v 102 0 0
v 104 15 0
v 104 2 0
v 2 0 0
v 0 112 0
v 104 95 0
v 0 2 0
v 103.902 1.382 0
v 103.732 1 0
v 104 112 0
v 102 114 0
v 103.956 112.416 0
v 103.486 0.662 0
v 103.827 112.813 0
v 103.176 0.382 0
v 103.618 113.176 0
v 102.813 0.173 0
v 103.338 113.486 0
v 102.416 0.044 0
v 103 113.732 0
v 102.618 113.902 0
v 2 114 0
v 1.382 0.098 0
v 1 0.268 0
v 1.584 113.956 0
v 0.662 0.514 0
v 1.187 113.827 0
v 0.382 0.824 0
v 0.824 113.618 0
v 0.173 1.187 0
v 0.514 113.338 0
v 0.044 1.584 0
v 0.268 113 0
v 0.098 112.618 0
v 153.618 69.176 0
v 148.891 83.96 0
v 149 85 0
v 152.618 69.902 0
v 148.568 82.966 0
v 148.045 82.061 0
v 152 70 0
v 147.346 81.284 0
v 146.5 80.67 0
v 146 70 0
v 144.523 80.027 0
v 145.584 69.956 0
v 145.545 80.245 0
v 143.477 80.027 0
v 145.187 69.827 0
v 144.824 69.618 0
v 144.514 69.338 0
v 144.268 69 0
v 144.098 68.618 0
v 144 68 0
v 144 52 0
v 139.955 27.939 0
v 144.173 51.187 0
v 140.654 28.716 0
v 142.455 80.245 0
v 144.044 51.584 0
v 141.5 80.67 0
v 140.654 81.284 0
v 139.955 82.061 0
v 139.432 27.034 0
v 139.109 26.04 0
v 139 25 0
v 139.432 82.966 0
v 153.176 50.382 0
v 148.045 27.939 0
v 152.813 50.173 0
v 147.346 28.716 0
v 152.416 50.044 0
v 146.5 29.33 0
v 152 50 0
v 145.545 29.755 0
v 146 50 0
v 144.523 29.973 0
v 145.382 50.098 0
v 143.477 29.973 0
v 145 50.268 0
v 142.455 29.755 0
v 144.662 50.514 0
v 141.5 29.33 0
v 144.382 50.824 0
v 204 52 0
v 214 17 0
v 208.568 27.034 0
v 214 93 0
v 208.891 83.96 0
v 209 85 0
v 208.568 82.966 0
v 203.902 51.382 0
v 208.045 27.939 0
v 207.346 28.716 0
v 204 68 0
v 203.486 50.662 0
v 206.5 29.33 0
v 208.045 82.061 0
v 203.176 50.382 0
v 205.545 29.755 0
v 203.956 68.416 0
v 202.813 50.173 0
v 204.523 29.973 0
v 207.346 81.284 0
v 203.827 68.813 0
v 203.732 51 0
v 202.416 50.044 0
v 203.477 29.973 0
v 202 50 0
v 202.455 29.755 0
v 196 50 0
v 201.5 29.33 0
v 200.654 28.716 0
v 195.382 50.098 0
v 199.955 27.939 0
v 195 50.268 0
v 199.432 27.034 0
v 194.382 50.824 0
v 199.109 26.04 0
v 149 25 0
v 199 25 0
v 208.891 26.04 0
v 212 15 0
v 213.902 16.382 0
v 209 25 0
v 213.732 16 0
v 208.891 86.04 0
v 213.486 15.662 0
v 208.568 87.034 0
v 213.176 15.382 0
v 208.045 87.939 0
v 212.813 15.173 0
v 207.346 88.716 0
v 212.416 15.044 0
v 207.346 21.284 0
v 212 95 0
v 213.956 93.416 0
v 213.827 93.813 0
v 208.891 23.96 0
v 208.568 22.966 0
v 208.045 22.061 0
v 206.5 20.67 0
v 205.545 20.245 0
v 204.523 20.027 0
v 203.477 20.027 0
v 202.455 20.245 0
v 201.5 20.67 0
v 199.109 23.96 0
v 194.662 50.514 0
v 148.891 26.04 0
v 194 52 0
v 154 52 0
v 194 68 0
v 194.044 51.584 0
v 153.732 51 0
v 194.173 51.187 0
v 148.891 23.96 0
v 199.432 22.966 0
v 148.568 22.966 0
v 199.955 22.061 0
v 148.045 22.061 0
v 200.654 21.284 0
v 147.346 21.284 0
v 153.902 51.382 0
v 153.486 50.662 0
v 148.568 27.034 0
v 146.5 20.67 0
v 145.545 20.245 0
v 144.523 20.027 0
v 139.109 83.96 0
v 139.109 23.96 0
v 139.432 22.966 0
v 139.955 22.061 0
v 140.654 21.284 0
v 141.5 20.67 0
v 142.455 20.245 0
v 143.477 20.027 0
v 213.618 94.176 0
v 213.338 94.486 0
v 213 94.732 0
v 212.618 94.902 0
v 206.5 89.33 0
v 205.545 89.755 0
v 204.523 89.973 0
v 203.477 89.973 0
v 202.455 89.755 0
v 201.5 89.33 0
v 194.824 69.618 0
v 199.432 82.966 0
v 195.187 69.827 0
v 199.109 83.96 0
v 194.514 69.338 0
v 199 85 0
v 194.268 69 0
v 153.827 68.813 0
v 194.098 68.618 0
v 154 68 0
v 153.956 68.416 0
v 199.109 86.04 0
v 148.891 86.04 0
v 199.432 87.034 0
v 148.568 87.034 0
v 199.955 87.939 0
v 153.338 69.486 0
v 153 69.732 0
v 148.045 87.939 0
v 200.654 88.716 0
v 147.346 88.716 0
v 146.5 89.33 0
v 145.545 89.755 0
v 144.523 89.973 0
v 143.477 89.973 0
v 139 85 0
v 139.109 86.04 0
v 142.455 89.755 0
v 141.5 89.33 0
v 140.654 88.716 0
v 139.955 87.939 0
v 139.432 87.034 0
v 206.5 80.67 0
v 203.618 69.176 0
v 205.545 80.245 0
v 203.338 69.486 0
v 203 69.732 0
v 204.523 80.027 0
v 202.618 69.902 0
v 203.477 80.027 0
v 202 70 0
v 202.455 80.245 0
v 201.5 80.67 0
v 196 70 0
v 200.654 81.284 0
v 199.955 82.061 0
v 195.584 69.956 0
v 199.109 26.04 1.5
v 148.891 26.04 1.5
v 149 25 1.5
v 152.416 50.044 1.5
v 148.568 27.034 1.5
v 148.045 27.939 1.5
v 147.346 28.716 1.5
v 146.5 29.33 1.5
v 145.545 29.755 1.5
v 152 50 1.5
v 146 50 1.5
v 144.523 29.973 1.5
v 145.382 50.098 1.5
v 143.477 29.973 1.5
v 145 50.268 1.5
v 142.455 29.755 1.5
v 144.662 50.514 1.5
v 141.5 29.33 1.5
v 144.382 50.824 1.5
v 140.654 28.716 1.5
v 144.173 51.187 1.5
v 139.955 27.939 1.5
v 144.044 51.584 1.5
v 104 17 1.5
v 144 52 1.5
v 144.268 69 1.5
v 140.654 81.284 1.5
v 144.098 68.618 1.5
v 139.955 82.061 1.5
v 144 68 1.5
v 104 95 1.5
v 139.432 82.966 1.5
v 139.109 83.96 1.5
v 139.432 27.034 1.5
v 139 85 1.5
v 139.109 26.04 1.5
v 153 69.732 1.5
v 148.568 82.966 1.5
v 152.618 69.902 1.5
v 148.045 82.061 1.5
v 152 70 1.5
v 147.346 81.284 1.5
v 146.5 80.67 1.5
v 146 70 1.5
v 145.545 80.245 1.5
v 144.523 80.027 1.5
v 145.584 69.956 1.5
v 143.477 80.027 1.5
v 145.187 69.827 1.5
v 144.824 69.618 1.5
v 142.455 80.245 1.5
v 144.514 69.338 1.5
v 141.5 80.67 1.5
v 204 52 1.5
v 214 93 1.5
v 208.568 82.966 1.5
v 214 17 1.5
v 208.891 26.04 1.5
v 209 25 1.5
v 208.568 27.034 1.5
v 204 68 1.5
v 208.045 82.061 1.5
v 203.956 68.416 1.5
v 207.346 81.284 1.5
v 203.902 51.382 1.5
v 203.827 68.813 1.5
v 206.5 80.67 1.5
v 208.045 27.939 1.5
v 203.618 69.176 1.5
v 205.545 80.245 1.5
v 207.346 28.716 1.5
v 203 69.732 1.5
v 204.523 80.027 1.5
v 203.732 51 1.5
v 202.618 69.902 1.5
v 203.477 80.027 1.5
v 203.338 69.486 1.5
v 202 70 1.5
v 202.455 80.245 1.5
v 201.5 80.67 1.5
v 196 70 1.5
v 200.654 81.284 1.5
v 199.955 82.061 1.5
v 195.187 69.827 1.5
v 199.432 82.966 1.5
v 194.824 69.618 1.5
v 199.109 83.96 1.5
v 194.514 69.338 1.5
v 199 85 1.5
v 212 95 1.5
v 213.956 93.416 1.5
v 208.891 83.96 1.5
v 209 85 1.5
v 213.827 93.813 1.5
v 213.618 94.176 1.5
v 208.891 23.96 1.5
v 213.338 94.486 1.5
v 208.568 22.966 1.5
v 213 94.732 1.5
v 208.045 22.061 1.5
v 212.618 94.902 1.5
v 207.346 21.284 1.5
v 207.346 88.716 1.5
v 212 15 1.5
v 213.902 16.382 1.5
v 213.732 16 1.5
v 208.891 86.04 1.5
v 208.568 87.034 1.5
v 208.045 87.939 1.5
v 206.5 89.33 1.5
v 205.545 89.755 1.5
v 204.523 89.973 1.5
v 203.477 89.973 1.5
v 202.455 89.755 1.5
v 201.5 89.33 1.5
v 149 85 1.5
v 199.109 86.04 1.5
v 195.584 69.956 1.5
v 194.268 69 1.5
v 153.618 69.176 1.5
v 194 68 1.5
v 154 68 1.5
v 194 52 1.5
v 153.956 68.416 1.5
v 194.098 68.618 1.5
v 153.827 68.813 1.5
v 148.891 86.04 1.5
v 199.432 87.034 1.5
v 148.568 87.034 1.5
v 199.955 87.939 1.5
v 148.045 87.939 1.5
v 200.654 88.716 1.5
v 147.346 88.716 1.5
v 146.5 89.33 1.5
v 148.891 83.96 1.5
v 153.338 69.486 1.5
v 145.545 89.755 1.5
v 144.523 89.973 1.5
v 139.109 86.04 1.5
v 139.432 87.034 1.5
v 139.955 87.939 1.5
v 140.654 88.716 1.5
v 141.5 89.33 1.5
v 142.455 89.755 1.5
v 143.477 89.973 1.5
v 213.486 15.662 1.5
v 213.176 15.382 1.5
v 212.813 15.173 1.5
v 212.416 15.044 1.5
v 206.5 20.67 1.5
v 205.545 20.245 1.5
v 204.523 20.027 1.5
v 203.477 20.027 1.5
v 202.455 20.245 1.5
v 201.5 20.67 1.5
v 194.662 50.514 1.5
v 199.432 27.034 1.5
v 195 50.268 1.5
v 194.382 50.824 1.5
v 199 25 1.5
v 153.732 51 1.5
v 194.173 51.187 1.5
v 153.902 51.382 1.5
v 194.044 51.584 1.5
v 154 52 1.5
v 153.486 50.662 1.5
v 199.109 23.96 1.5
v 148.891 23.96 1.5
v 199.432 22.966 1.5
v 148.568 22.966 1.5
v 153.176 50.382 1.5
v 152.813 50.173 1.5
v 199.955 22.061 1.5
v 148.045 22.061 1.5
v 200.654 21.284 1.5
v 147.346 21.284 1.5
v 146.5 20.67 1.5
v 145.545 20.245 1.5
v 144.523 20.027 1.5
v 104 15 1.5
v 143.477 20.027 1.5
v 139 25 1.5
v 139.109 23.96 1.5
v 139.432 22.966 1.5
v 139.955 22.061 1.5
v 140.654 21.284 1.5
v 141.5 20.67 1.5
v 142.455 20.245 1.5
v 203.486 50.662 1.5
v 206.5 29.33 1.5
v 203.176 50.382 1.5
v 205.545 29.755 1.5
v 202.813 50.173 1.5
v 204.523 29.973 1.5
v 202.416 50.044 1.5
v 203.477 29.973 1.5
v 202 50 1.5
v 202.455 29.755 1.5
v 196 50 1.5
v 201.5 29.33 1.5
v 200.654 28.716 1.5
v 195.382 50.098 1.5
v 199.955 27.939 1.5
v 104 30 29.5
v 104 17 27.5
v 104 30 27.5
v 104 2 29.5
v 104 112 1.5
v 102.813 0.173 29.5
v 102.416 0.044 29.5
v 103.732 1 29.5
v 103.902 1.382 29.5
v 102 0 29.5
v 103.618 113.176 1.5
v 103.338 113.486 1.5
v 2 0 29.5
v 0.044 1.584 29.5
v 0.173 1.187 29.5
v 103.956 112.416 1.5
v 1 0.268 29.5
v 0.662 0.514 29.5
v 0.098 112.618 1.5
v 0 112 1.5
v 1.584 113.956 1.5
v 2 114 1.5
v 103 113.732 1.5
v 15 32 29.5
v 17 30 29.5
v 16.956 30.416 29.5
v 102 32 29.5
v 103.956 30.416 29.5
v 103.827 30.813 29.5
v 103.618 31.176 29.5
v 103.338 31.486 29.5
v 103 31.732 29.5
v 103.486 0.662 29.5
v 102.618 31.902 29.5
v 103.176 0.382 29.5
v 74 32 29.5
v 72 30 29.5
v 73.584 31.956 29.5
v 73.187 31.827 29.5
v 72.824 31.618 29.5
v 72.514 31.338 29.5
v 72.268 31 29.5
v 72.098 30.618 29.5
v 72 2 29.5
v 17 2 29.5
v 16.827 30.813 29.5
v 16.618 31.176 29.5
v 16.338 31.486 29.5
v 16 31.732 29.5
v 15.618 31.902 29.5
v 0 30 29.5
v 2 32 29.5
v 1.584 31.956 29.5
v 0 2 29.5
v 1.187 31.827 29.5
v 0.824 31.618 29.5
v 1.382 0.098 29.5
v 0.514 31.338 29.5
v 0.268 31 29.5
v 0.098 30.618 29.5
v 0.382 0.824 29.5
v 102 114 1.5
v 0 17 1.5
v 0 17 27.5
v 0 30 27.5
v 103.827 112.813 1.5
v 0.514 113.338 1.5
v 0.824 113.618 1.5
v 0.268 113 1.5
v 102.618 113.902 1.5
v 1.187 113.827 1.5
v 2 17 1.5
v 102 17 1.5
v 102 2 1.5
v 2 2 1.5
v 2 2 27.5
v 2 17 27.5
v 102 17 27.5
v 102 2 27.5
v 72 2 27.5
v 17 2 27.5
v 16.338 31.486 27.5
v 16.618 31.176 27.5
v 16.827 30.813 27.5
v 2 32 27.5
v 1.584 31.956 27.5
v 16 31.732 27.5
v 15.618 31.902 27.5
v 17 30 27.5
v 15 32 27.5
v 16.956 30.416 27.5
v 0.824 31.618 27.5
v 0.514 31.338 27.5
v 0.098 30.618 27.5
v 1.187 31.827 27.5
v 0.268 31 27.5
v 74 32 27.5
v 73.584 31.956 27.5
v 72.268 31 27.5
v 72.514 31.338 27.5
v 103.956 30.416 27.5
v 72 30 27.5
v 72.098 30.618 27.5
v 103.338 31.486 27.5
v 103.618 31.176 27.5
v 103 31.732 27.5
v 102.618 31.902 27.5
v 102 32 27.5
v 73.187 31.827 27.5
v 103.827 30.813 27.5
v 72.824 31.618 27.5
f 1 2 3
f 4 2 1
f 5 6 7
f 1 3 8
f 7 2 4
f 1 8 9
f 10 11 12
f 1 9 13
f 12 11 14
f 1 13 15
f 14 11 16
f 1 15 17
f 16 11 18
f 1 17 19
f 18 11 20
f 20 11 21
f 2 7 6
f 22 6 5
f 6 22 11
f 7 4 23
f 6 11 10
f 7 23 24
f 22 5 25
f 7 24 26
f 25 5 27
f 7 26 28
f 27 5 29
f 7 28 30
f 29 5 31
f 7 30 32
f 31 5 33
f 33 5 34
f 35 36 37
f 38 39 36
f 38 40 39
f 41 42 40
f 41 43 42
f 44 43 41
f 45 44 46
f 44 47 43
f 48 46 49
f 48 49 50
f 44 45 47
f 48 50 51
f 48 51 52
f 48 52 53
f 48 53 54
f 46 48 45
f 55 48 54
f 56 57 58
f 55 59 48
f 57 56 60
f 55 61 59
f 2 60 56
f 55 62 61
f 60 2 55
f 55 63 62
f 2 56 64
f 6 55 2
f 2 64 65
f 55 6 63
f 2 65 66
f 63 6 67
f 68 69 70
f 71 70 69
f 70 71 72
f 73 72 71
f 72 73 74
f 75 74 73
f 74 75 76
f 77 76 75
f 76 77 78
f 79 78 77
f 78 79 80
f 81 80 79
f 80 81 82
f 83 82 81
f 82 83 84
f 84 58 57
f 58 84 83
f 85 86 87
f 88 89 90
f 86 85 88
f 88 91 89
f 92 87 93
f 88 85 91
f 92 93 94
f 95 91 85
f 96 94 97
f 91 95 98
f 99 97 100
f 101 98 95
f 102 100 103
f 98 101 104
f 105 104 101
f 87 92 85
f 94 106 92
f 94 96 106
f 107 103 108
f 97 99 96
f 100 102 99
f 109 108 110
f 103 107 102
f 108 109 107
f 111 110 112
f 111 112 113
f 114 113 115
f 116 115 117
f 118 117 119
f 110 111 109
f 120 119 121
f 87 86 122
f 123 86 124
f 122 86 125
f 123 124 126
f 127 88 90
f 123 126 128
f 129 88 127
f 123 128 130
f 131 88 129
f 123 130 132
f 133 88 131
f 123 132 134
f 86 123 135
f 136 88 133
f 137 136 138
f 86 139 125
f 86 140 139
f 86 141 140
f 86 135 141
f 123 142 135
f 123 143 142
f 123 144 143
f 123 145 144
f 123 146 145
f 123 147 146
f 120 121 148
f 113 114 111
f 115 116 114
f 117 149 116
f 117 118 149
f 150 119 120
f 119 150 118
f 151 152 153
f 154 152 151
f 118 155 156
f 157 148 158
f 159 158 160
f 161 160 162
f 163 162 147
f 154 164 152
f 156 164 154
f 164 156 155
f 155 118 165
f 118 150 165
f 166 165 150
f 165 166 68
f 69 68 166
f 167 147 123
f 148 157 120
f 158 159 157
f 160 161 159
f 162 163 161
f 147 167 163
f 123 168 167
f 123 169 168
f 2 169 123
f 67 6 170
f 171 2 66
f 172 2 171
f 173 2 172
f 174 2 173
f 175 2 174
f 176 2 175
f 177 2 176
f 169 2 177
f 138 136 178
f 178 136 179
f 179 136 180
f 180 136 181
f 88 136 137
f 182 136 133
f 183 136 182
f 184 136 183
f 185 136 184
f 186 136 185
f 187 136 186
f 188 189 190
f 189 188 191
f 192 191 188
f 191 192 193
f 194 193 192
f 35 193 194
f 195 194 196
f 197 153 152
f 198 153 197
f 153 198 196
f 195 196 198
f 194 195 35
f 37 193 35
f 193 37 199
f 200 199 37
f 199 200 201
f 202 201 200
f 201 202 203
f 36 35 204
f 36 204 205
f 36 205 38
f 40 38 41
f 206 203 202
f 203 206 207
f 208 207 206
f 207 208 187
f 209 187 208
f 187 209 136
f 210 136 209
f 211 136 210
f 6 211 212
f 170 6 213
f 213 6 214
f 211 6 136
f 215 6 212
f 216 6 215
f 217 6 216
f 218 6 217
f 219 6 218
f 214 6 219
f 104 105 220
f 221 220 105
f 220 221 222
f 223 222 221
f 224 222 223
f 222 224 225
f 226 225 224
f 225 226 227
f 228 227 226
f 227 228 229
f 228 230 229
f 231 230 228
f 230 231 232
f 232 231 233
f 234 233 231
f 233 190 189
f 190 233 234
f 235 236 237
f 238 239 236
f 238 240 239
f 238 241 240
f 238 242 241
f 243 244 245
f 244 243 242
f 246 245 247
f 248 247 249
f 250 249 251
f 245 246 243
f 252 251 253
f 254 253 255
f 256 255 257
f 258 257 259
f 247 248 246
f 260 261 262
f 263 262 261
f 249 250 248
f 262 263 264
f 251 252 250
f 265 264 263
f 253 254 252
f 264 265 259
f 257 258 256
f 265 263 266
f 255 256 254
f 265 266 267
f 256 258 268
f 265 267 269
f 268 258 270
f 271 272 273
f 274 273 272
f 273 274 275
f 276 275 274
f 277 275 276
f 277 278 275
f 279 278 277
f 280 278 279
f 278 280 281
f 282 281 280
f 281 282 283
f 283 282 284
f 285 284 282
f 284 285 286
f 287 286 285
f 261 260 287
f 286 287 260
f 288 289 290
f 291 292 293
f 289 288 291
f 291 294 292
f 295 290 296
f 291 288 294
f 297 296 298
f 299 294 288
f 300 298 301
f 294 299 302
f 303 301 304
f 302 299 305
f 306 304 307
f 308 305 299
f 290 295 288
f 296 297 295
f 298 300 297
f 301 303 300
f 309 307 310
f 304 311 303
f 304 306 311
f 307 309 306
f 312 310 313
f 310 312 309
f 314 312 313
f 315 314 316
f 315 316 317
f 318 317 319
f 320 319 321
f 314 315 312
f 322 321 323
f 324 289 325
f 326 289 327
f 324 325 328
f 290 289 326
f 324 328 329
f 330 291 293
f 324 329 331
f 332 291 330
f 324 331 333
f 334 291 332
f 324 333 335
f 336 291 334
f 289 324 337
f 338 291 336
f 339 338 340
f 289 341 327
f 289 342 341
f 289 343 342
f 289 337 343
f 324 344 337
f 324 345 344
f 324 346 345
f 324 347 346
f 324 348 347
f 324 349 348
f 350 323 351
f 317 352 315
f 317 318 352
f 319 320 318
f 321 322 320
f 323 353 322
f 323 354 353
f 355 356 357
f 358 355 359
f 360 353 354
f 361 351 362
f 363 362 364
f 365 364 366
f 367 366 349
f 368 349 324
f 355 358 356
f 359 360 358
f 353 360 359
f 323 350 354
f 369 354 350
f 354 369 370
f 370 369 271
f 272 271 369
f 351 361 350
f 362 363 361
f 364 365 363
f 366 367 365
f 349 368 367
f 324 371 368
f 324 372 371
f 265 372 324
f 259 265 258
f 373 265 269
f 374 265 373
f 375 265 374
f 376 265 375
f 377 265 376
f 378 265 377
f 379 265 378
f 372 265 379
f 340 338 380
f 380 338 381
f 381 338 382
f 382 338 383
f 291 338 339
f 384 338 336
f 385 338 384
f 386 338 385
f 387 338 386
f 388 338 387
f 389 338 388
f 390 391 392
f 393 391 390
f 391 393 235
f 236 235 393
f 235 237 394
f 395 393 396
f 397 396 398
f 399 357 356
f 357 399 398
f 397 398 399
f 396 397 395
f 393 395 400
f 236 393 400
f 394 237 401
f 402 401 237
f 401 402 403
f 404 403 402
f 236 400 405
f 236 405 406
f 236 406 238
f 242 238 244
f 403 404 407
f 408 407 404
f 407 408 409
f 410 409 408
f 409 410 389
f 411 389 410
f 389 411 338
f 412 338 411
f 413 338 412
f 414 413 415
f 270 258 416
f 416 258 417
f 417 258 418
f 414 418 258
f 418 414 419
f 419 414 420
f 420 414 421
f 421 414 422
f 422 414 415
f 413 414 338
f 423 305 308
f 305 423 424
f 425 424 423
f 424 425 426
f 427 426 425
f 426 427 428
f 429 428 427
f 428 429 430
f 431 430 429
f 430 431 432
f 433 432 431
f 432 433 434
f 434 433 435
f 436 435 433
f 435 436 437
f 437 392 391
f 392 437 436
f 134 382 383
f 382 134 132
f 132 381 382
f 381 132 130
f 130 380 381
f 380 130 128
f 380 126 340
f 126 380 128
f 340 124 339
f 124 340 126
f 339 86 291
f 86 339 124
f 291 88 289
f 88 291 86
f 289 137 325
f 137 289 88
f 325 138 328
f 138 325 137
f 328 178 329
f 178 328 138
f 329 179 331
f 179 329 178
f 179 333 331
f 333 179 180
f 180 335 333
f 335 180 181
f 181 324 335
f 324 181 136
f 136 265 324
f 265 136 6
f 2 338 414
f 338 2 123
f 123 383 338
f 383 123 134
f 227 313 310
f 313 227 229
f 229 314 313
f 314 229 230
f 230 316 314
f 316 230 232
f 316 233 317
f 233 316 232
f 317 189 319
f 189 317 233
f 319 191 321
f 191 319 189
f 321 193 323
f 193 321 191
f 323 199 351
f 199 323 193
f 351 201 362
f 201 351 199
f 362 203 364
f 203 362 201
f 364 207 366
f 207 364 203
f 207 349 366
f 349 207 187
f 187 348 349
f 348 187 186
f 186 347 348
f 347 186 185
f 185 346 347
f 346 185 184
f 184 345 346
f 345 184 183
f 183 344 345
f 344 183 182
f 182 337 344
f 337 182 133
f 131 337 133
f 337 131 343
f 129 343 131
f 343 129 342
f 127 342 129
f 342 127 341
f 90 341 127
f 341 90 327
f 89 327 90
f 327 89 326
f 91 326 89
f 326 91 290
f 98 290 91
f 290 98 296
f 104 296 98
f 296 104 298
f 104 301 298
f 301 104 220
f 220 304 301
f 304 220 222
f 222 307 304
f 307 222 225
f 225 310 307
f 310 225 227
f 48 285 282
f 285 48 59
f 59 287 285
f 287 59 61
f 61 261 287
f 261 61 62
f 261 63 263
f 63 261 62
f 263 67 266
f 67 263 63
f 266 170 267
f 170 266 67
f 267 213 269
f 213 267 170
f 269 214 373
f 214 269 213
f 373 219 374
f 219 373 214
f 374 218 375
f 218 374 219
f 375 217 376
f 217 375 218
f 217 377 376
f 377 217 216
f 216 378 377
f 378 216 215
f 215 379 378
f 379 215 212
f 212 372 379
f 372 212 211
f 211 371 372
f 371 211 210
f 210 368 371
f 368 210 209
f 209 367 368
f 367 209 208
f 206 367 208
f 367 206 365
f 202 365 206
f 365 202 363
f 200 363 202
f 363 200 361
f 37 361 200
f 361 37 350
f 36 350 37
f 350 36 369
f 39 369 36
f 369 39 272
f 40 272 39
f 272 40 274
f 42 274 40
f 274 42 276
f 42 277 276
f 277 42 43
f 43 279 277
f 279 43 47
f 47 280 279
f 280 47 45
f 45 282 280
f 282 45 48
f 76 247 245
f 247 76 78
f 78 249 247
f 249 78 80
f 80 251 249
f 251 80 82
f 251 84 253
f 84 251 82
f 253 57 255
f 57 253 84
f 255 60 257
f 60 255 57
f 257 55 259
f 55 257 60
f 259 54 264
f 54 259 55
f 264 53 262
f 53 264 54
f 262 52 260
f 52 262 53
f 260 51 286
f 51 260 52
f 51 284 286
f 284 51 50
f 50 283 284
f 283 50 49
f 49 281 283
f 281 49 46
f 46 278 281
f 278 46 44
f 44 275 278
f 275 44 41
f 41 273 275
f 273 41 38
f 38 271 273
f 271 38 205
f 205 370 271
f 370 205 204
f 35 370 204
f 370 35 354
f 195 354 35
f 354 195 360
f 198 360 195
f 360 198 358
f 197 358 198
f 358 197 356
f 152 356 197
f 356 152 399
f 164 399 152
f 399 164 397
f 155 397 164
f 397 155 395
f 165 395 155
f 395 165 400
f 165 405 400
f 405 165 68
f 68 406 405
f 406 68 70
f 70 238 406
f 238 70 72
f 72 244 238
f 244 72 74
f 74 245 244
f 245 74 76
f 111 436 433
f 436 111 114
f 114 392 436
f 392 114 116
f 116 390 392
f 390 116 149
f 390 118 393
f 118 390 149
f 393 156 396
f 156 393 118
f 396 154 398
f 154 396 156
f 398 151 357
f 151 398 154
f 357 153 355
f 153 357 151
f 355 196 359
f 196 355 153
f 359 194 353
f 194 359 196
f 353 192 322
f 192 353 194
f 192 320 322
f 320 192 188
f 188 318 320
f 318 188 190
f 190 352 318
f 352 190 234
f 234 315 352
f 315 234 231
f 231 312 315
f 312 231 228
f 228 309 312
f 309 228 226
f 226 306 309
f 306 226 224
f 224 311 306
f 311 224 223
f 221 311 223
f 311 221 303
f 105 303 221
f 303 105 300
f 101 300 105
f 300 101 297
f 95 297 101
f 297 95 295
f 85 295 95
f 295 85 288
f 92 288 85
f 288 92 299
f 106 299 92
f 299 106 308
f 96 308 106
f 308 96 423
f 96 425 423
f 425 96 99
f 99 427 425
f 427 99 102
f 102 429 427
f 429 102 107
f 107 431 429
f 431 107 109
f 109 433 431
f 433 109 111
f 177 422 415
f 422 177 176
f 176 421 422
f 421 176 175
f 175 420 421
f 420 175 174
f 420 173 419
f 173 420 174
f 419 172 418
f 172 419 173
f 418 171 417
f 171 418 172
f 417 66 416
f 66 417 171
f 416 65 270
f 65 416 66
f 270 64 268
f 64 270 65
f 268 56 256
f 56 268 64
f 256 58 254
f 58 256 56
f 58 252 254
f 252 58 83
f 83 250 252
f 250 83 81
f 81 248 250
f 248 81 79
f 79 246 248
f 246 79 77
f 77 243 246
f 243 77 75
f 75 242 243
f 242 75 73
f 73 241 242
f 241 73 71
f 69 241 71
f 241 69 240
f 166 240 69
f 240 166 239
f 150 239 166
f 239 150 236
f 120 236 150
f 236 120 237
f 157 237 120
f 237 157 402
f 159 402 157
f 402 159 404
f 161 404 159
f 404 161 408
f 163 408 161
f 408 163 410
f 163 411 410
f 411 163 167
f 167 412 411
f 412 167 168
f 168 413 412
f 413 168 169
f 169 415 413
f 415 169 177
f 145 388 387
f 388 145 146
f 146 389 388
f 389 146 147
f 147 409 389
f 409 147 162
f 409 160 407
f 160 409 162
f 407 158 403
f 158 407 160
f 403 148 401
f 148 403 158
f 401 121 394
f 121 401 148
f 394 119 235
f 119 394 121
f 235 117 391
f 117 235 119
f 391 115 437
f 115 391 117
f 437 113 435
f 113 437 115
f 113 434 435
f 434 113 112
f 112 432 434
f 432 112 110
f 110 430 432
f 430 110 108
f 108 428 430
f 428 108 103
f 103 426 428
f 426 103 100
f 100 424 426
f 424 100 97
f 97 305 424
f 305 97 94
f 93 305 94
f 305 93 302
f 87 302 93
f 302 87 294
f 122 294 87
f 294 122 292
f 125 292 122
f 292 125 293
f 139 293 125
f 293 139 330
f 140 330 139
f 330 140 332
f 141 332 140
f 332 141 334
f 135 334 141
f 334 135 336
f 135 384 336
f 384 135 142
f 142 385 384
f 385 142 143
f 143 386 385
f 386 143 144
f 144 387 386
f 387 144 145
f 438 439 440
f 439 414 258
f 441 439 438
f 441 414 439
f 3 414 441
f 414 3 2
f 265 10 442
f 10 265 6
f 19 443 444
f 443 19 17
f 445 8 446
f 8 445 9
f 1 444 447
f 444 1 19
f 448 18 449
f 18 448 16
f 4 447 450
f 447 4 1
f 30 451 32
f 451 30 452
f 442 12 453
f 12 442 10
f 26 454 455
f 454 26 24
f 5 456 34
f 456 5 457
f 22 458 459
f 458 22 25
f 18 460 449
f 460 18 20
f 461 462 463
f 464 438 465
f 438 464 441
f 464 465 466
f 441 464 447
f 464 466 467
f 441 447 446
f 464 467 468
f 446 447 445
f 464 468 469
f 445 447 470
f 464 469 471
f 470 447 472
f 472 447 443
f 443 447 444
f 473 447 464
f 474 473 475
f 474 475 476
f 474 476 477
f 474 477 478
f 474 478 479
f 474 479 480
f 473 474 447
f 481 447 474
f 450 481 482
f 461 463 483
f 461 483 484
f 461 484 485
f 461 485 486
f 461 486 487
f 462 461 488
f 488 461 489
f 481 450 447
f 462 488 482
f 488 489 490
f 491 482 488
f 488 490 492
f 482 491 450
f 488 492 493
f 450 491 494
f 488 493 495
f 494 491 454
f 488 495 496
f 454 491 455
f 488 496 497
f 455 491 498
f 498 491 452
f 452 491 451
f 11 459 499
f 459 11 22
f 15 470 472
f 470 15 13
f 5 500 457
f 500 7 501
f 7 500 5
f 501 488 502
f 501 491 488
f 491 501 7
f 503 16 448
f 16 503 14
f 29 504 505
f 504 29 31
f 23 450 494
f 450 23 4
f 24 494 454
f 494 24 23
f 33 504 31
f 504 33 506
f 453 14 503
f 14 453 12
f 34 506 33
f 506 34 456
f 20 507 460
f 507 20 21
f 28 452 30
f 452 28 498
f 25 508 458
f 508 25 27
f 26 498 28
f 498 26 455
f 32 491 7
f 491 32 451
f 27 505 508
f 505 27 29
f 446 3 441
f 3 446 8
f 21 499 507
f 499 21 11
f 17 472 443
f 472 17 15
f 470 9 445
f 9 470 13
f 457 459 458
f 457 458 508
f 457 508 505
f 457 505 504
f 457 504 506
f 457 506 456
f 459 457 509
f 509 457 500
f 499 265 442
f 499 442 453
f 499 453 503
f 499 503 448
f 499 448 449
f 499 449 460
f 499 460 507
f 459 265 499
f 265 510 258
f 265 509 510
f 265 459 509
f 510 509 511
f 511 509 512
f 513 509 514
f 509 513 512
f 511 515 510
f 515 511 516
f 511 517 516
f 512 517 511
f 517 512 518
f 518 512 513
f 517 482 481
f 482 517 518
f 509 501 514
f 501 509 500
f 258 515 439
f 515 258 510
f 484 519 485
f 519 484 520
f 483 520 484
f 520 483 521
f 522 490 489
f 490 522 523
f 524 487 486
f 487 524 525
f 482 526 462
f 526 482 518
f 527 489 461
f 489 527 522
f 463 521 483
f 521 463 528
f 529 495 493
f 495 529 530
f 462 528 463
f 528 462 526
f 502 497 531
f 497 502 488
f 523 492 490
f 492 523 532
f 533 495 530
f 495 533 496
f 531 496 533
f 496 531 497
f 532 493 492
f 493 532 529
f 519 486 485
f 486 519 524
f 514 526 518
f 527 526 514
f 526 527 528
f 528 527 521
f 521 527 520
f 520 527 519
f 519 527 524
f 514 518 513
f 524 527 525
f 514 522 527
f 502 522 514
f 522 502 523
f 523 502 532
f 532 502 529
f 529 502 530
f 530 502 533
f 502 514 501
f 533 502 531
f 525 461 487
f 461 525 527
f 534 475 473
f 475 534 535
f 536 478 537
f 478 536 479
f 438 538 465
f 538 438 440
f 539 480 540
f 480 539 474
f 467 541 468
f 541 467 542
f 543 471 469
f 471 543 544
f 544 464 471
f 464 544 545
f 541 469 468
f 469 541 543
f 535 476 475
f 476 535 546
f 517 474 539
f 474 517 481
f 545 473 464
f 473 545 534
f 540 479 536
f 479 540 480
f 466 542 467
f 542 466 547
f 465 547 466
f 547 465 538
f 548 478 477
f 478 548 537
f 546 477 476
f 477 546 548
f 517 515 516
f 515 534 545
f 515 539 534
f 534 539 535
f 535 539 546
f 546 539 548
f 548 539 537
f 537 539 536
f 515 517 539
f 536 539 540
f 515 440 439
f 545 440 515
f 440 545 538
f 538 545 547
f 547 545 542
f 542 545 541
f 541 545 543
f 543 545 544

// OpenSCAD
$fn = 30;

base_depth = 1.5;
wall_thickness = 2;

ont_width = 80; // 611B/D
// ont_width = 90; // 611Q
ont_height = 80;

ont_screw_mount = 50;
ont_screw_width = 10;
ont_screw_height = 20;
ont_screw_pos_y = 35;
ont_screw_round = 2;

ont_feet_d = 10;
ont_feet_margin = 5;

ups_width = 99;
ups_depth = 109;
ups_height = 25;
ups_padding = 1;

ups_left_tray_height = 30;
ups_left_tray_width = 15;
ups_right_tray_height = 30;
ups_right_tray_width = 30;
ups_side_tray_height = 15;

gap = 30;

module ont_base() {
	linear_extrude(base_depth)
	difference() {
		// base
		offset(wall_thickness) offset(-wall_thickness)
		square([ont_width, ont_height]);
		
		// feet
		translate([ont_feet_margin + ont_feet_d / 2, ont_feet_margin + ont_feet_d / 2])
		circle(d = ont_feet_d);

		translate([ont_width - ont_feet_margin - ont_feet_d / 2, ont_feet_margin + ont_feet_d / 2])
		circle(d = ont_feet_d);

		translate([ont_width - ont_feet_margin - ont_feet_d / 2, ont_height - ont_feet_margin - ont_feet_d / 2])
		circle(d = ont_feet_d);
		
		translate([ont_feet_margin + ont_feet_d / 2, ont_height - ont_feet_margin - ont_feet_d / 2])
		circle(d = ont_feet_d);
		
		// screw holes
		offset(ont_screw_round) offset(-ont_screw_round)
		translate([ont_width / 2 - ont_screw_width / 2 - ont_screw_mount / 2, ont_height - (ont_screw_pos_y + ont_screw_height / 2)])
		square([ont_screw_width, ont_screw_height]);

		offset(ont_screw_round) offset(-ont_screw_round)
		translate([ont_width / 2 - ont_screw_width / 2 + ont_screw_mount / 2, ont_height - (ont_screw_pos_y + ont_screw_height / 2)])
		square([ont_screw_width, ont_screw_height]);
	};
}

module ups_base() {
	difference() {
		// container
		linear_extrude(base_depth + ups_height +  ups_padding + wall_thickness)
		offset(wall_thickness) offset(-wall_thickness)
		square([ups_width + 2 * wall_thickness + ups_padding, ups_depth + 2 * 
	wall_thickness + ups_padding]);

		// cut ups out
		translate([0, 0, base_depth])
		linear_extrude(ups_height + ups_padding)
		translate([wall_thickness, wall_thickness])
		square([ups_width + ups_padding, ups_depth + ups_padding]);
		
		// cut top off
		translate([-1, wall_thickness + ups_side_tray_height, base_depth])
		linear_extrude(ups_height + ups_padding + wall_thickness + 1)
		square([ups_width + ups_padding + 2 * wall_thickness + 2, ups_depth - ups_side_tray_height + ups_padding + 2 * wall_thickness + 1]);
		
		// cut front out
		translate([wall_thickness, wall_thickness, base_depth])
		linear_extrude(ups_height + ups_padding + wall_thickness + 1)
		square([ups_width + ups_padding, ups_side_tray_height + 1]);
	}

	// left tray
	translate([0, 0, base_depth + ups_height + ups_padding])
	linear_extrude(wall_thickness)
	offset(wall_thickness) offset(-wall_thickness)
	square([wall_thickness + ups_left_tray_width, wall_thickness + ups_left_tray_height]);

	// right tray
	translate([wall_thickness + ups_width + ups_padding- ups_right_tray_width, 0, base_depth + ups_height + ups_padding])
	linear_extrude(wall_thickness)
	offset(wall_thickness) offset(-wall_thickness)
	square([wall_thickness + ups_right_tray_width, wall_thickness + ups_right_tray_height]);
}

module connector() {
	linear_extrude(base_depth)
	square([gap + wall_thickness, ont_height]);
}

translate([ups_width + ups_padding + 2 * wall_thickness, (ups_depth + ups_padding) / 2 - ont_height / 2, 0]) {
	translate([gap, 0, 0]) ont_base();
	connector();
}
ups_base();
